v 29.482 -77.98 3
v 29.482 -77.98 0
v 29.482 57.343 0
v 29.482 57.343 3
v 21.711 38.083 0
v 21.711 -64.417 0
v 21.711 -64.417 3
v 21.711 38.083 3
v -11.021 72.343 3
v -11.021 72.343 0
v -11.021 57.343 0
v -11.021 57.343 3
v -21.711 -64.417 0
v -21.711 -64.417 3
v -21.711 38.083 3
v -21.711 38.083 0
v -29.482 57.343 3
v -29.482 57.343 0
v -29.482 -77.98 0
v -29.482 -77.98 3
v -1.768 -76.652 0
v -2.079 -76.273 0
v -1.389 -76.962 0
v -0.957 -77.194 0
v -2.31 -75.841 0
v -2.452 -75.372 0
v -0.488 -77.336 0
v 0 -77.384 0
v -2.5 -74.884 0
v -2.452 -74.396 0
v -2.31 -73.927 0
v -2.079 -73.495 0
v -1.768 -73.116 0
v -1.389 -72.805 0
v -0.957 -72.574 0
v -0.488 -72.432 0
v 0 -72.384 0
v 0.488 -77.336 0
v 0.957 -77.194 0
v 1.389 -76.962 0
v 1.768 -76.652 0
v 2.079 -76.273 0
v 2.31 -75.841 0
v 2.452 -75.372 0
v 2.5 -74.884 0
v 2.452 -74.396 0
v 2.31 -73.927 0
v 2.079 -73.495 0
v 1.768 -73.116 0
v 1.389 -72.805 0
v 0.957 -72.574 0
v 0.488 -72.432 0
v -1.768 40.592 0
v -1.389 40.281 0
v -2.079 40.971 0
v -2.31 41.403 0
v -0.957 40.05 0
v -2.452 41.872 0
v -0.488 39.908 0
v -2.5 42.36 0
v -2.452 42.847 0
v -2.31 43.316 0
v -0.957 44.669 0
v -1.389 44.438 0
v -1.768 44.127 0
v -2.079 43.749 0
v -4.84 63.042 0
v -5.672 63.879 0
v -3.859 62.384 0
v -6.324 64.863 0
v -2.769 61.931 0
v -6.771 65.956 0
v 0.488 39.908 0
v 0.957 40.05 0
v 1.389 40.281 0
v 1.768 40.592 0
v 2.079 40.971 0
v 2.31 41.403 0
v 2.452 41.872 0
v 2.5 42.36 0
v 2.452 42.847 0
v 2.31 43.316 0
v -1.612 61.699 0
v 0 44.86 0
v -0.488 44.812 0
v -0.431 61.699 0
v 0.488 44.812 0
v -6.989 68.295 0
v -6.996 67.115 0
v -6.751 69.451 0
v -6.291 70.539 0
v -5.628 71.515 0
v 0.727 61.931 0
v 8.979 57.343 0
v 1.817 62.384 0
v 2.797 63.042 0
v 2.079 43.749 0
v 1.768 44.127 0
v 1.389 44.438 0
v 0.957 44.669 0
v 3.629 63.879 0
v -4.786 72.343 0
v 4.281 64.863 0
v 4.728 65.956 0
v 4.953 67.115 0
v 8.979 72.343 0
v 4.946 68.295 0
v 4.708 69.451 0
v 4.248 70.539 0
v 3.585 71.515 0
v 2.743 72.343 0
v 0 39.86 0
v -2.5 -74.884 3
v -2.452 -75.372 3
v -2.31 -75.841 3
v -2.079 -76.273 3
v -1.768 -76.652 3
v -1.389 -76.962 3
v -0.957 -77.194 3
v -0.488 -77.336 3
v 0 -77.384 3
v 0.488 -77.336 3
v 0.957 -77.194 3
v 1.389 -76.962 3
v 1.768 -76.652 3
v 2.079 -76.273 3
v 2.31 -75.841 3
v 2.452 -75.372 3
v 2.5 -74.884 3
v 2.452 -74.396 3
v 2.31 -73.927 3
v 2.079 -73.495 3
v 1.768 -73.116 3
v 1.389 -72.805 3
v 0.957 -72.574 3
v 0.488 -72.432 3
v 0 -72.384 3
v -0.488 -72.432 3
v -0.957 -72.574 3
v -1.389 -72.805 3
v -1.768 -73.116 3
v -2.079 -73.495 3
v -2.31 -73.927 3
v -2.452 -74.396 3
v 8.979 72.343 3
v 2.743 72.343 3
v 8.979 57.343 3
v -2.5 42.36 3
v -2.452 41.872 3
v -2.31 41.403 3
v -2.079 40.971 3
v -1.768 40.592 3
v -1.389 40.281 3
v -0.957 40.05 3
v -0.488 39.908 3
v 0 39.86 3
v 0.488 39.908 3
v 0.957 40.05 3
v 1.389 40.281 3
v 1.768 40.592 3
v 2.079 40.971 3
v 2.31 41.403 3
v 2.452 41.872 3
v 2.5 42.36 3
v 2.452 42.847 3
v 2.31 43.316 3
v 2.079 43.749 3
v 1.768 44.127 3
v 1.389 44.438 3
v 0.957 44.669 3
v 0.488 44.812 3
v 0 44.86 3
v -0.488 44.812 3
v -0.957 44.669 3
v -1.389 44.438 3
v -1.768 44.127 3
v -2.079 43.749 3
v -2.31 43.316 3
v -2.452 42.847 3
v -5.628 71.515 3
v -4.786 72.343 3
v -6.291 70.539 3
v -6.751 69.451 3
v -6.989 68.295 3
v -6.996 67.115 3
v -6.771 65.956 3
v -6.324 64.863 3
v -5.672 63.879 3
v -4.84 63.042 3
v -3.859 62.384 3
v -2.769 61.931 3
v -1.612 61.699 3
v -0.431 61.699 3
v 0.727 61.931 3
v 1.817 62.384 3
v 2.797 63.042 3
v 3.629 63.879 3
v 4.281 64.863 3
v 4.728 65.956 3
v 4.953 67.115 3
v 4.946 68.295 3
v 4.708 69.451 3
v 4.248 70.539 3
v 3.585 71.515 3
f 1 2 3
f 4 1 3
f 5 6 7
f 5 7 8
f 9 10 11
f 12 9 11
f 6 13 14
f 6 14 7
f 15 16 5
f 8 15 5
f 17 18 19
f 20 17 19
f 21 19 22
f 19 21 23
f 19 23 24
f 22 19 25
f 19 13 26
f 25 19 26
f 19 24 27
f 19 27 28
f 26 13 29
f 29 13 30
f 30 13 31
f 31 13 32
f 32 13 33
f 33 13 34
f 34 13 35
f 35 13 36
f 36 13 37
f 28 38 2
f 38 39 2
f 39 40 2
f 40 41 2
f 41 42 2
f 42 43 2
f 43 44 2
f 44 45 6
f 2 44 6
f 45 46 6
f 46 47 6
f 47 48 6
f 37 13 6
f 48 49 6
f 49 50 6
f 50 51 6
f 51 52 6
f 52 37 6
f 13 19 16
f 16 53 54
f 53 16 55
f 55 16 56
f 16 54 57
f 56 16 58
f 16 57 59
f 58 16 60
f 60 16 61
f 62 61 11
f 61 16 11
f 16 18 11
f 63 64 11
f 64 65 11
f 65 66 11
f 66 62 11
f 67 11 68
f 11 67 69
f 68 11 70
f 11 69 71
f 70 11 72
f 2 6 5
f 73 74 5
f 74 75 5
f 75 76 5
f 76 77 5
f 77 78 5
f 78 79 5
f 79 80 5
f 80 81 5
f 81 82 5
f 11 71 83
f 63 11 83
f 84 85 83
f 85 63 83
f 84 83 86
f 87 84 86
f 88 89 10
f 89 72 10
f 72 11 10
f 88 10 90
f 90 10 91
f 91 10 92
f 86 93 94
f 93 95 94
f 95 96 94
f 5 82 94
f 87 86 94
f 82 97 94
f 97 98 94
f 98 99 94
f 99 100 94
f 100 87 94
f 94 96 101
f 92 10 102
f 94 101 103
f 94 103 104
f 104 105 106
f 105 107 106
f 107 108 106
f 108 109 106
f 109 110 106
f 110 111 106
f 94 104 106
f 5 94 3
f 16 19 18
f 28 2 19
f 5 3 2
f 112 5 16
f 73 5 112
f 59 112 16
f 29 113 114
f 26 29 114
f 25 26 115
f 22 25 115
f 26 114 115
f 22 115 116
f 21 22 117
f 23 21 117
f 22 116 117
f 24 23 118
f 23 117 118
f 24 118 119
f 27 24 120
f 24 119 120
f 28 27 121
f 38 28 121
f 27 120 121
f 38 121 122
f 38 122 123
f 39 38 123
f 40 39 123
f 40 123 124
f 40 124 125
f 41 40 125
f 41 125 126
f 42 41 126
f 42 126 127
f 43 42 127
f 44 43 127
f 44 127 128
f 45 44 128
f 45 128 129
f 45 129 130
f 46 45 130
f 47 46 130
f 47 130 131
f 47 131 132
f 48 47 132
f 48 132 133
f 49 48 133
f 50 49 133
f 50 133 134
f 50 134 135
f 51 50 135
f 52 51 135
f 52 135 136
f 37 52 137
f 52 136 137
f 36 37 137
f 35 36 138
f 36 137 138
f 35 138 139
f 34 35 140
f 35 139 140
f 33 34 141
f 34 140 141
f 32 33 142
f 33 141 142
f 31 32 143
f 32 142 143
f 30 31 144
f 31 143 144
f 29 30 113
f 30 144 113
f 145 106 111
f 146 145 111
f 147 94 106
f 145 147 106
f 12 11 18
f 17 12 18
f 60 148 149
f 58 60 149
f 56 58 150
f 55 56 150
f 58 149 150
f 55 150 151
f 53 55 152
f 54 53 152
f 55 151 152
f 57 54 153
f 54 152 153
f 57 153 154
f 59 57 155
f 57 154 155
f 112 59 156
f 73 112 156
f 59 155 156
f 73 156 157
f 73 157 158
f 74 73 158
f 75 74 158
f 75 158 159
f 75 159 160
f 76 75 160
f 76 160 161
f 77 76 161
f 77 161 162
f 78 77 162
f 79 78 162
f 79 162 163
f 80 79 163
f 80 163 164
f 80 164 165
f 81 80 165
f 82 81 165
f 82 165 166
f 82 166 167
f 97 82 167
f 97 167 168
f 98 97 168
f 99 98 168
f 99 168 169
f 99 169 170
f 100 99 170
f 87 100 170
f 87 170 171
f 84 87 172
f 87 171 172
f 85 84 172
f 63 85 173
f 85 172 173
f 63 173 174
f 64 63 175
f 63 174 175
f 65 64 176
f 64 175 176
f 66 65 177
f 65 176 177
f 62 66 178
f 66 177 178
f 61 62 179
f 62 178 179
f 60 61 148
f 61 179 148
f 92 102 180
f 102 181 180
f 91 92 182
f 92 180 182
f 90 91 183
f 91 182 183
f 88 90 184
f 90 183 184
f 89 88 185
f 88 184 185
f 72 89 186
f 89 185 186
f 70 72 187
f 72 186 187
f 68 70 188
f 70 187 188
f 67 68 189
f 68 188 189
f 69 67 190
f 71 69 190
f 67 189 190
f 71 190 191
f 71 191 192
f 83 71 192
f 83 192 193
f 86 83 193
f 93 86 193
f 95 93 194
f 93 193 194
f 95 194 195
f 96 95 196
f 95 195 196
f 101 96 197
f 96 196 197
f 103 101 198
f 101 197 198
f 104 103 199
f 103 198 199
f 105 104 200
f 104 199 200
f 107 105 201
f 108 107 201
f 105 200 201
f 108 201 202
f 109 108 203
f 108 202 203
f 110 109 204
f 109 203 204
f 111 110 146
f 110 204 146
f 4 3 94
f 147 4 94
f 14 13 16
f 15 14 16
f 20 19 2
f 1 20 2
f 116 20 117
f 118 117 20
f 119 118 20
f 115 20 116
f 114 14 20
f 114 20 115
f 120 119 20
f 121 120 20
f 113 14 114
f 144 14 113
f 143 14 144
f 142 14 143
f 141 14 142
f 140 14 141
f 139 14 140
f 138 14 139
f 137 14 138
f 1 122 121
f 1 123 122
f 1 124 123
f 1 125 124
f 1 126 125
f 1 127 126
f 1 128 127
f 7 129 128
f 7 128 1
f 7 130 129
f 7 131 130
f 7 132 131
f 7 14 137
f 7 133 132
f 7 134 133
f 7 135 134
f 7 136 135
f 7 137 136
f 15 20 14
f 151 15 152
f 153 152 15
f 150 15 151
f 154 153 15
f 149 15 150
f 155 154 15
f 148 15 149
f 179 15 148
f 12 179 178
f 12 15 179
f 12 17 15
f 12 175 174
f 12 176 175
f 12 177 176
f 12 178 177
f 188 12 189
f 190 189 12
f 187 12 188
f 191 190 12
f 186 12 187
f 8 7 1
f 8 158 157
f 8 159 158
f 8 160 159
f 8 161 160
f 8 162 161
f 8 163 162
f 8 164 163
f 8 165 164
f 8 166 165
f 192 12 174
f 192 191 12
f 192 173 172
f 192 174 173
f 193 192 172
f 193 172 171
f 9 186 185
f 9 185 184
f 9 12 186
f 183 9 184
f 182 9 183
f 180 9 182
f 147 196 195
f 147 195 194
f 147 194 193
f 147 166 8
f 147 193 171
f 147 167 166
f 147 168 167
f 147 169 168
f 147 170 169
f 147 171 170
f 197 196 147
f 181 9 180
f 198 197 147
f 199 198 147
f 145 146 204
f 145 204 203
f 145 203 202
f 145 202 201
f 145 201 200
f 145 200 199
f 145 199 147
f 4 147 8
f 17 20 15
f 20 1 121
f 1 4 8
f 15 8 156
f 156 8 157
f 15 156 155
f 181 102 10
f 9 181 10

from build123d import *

# Parameters (mm, degrees)
F0_W     = 43.4223142958
F0_H     = 102.4999973916
F1_DEPTH = 3
F2_D     = 12
F2_DEPTH = 50
F2_TIP   = 3.6051637142
F3_D     = 5
F3_DEPTH = 50
F3_TIP   = 1.5021515476


with BuildPart() as f1:
    # F0 (on Top) → F1 (new body)
    with BuildSketch(Plane.XY):
        Polygon((-29.4820813204, 57.3426440605), (-29.4820813204, -77.9801009848), (29.4820813204, -77.9801009848), (29.4820813204, 57.3426440605), (8.9785616139, 57.3426440605), (8.9785616139, 72.3426440605), (-11.0214383861, 72.3426440605), (-11.0214383861, 57.3426440605), align=None)
        with Locations((0, -13.1670495591)):
            Rectangle(F0_W, F0_H, mode=Mode.SUBTRACT)
    extrude(amount=F1_DEPTH)

    # F2
    with Locations(Plane(origin=(0, 0, 0), x_dir=(1, 0, 0), z_dir=(0, 0, -1))):
        with Locations((-1.0214383861, -67.6703378558)):
            Hole(F2_D / 2, depth=F2_DEPTH)
            with Locations((0, 0, -(F2_DEPTH + F2_TIP / 2))):  # 118° drill point
                Cone(0, F2_D / 2, F2_TIP, mode=Mode.SUBTRACT)

    # F3
    with Locations(Plane(origin=(0, 0, 0), x_dir=(1, 0, 0), z_dir=(0, 0, -1))):
        with Locations((0, -42.3597060144), (0, 74.8838037252)):
            Hole(F3_D / 2, depth=F3_DEPTH)
            with Locations((0, 0, -(F3_DEPTH + F3_TIP / 2))):  # 118° drill point
                Cone(0, F3_D / 2, F3_TIP, mode=Mode.SUBTRACT)


solid = f1.part
